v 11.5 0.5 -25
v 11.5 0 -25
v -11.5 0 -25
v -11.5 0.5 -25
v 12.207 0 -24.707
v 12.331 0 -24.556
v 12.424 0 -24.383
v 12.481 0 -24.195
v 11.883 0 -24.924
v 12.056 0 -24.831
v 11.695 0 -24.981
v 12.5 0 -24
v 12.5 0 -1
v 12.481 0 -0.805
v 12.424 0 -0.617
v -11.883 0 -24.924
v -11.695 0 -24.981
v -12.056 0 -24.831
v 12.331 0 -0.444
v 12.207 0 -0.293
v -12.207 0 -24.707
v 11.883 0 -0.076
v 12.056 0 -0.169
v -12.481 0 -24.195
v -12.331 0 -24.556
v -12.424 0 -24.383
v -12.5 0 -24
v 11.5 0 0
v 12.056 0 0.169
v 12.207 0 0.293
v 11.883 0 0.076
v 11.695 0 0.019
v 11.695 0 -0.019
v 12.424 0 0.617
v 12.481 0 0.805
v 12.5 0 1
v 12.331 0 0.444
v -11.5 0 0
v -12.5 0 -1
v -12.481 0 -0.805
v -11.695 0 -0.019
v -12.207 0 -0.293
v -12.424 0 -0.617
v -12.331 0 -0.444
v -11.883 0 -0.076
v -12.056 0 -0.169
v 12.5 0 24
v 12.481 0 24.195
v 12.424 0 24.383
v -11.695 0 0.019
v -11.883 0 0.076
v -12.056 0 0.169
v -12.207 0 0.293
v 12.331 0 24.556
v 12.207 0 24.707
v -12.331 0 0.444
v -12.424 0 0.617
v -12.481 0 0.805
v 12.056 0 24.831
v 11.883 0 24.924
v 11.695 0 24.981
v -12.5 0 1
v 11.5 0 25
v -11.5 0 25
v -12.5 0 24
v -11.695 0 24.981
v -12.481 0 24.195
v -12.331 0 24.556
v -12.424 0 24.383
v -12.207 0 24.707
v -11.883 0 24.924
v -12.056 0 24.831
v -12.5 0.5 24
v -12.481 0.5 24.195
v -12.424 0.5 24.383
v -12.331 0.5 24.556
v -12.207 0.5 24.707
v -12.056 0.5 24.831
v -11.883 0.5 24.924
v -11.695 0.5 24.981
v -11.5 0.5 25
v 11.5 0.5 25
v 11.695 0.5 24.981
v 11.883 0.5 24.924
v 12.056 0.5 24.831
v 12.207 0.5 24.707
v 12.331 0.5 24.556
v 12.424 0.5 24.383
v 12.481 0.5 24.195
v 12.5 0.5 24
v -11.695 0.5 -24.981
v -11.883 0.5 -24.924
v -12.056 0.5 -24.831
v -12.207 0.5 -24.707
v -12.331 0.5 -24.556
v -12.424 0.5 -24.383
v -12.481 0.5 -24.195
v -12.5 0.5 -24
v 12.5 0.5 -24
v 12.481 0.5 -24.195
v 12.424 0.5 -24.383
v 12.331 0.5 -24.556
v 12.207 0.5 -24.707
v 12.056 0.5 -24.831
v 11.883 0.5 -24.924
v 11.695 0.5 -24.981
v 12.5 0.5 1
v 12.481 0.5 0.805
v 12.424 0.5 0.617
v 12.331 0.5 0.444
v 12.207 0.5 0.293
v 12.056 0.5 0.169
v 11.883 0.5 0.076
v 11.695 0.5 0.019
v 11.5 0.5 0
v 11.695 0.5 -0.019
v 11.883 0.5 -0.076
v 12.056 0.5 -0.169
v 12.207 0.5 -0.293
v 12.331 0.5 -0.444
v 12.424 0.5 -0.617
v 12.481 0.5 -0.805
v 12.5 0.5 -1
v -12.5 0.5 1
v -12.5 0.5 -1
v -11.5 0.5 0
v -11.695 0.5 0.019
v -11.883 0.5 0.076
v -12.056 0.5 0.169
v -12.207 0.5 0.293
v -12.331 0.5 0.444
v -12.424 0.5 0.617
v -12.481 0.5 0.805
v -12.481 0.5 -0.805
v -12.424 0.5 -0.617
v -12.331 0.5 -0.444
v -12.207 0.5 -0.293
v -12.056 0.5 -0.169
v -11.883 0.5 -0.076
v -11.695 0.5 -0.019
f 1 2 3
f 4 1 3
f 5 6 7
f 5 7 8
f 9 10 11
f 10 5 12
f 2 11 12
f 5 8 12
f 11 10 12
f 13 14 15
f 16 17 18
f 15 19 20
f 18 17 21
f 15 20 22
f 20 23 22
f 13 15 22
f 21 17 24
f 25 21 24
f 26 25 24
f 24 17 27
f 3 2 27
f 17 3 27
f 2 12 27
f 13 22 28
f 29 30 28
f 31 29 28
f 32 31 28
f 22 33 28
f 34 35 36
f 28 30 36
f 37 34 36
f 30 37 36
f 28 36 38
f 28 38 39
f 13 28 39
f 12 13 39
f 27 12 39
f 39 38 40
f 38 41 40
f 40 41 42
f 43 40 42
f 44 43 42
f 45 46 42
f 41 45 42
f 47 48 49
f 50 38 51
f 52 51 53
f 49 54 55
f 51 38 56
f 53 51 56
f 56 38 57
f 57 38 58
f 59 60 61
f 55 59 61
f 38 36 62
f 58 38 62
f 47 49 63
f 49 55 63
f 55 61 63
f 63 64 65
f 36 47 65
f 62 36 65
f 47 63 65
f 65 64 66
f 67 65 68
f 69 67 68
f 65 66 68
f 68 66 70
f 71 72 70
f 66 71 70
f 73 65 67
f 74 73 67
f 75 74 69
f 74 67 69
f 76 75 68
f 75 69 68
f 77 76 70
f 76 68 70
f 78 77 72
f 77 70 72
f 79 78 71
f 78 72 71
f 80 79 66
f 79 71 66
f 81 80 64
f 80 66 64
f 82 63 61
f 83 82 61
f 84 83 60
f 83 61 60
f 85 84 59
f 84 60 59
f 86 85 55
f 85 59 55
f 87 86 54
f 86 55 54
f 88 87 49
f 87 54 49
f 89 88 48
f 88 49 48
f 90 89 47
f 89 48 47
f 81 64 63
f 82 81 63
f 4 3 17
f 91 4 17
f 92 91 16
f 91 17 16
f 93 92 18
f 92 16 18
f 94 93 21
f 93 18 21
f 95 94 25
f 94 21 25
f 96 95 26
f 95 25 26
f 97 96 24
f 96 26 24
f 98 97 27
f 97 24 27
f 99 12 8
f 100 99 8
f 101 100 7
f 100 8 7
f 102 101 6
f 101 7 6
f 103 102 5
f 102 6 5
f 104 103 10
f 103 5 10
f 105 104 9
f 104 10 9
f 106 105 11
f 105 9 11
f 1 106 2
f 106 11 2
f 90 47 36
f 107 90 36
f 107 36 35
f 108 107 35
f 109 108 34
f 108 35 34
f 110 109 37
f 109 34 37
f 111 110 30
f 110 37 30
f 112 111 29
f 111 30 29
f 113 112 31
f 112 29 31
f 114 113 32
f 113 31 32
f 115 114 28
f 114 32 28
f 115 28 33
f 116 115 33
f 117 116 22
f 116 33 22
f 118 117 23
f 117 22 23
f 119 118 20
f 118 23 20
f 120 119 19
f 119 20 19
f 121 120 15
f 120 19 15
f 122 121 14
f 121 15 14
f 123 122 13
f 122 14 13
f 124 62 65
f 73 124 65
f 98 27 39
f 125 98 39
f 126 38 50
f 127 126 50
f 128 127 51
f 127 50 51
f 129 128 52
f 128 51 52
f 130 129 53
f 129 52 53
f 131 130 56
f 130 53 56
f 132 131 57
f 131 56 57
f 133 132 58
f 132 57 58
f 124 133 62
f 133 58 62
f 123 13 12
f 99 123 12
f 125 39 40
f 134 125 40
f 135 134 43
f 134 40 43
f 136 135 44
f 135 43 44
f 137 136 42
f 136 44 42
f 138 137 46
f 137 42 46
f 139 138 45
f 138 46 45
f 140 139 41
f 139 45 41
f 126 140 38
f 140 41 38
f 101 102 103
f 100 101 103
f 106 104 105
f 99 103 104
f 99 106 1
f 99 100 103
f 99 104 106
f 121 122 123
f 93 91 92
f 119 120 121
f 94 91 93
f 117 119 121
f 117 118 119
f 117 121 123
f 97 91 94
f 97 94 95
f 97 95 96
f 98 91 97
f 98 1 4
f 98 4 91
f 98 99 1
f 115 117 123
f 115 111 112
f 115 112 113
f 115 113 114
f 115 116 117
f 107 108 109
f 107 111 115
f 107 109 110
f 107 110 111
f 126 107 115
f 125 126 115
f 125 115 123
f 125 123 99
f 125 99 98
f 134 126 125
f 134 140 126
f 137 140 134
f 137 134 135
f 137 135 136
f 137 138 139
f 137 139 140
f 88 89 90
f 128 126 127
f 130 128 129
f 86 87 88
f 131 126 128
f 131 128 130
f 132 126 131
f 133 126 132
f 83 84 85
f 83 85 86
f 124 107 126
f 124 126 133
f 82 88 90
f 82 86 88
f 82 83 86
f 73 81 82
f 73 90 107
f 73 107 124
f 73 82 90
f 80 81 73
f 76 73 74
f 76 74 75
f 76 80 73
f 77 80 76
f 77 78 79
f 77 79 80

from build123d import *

# Parameters (mm, degrees)
EXTRUDE_1_DEPTH          = 0.5
PATTERN_CIRCULAR_1_COUNT = 2


with BuildPart() as part:
    # 草图1 → 凸台-拉伸1 (new body)
    with BuildSketch(Plane(origin=(0, 0, 0), x_dir=(1, 0, 0), z_dir=(0, 1, 0))):
        with BuildLine():
            Line((-11.5, 0), (11.5, 0))
            ThreePointArc((11.5, 0), (12.207106781, 0.292893219), (12.5, 1))
            Line((12.5, 1), (12.5, 24))
            ThreePointArc((12.5, 24), (12.207106781, 24.707106781), (11.5, 25))
            Line((11.5, 25), (-11.5, 25))
            ThreePointArc((-11.5, 25), (-12.207106781, 24.707106781), (-12.5, 24))
            Line((-12.5, 24), (-12.5, 1))
            ThreePointArc((-12.5, 1), (-12.207106781, 0.292893219), (-11.5, 0))
        make_face()
    extrude(amount=EXTRUDE_1_DEPTH)


with BuildPart() as pattern_circular_1_1:
    # 阵列(圆周)1: pattern copy
    add(part.part.rotate(Axis((0, 0, 0), (0, 1, 0)), 1 * 360 / PATTERN_CIRCULAR_1_COUNT))


with BuildPart() as part_1:
    add(part.part)

    # Combine 1: union 阵列(圆周)1_1
    add(pattern_circular_1_1.part)


solid = part_1.part
